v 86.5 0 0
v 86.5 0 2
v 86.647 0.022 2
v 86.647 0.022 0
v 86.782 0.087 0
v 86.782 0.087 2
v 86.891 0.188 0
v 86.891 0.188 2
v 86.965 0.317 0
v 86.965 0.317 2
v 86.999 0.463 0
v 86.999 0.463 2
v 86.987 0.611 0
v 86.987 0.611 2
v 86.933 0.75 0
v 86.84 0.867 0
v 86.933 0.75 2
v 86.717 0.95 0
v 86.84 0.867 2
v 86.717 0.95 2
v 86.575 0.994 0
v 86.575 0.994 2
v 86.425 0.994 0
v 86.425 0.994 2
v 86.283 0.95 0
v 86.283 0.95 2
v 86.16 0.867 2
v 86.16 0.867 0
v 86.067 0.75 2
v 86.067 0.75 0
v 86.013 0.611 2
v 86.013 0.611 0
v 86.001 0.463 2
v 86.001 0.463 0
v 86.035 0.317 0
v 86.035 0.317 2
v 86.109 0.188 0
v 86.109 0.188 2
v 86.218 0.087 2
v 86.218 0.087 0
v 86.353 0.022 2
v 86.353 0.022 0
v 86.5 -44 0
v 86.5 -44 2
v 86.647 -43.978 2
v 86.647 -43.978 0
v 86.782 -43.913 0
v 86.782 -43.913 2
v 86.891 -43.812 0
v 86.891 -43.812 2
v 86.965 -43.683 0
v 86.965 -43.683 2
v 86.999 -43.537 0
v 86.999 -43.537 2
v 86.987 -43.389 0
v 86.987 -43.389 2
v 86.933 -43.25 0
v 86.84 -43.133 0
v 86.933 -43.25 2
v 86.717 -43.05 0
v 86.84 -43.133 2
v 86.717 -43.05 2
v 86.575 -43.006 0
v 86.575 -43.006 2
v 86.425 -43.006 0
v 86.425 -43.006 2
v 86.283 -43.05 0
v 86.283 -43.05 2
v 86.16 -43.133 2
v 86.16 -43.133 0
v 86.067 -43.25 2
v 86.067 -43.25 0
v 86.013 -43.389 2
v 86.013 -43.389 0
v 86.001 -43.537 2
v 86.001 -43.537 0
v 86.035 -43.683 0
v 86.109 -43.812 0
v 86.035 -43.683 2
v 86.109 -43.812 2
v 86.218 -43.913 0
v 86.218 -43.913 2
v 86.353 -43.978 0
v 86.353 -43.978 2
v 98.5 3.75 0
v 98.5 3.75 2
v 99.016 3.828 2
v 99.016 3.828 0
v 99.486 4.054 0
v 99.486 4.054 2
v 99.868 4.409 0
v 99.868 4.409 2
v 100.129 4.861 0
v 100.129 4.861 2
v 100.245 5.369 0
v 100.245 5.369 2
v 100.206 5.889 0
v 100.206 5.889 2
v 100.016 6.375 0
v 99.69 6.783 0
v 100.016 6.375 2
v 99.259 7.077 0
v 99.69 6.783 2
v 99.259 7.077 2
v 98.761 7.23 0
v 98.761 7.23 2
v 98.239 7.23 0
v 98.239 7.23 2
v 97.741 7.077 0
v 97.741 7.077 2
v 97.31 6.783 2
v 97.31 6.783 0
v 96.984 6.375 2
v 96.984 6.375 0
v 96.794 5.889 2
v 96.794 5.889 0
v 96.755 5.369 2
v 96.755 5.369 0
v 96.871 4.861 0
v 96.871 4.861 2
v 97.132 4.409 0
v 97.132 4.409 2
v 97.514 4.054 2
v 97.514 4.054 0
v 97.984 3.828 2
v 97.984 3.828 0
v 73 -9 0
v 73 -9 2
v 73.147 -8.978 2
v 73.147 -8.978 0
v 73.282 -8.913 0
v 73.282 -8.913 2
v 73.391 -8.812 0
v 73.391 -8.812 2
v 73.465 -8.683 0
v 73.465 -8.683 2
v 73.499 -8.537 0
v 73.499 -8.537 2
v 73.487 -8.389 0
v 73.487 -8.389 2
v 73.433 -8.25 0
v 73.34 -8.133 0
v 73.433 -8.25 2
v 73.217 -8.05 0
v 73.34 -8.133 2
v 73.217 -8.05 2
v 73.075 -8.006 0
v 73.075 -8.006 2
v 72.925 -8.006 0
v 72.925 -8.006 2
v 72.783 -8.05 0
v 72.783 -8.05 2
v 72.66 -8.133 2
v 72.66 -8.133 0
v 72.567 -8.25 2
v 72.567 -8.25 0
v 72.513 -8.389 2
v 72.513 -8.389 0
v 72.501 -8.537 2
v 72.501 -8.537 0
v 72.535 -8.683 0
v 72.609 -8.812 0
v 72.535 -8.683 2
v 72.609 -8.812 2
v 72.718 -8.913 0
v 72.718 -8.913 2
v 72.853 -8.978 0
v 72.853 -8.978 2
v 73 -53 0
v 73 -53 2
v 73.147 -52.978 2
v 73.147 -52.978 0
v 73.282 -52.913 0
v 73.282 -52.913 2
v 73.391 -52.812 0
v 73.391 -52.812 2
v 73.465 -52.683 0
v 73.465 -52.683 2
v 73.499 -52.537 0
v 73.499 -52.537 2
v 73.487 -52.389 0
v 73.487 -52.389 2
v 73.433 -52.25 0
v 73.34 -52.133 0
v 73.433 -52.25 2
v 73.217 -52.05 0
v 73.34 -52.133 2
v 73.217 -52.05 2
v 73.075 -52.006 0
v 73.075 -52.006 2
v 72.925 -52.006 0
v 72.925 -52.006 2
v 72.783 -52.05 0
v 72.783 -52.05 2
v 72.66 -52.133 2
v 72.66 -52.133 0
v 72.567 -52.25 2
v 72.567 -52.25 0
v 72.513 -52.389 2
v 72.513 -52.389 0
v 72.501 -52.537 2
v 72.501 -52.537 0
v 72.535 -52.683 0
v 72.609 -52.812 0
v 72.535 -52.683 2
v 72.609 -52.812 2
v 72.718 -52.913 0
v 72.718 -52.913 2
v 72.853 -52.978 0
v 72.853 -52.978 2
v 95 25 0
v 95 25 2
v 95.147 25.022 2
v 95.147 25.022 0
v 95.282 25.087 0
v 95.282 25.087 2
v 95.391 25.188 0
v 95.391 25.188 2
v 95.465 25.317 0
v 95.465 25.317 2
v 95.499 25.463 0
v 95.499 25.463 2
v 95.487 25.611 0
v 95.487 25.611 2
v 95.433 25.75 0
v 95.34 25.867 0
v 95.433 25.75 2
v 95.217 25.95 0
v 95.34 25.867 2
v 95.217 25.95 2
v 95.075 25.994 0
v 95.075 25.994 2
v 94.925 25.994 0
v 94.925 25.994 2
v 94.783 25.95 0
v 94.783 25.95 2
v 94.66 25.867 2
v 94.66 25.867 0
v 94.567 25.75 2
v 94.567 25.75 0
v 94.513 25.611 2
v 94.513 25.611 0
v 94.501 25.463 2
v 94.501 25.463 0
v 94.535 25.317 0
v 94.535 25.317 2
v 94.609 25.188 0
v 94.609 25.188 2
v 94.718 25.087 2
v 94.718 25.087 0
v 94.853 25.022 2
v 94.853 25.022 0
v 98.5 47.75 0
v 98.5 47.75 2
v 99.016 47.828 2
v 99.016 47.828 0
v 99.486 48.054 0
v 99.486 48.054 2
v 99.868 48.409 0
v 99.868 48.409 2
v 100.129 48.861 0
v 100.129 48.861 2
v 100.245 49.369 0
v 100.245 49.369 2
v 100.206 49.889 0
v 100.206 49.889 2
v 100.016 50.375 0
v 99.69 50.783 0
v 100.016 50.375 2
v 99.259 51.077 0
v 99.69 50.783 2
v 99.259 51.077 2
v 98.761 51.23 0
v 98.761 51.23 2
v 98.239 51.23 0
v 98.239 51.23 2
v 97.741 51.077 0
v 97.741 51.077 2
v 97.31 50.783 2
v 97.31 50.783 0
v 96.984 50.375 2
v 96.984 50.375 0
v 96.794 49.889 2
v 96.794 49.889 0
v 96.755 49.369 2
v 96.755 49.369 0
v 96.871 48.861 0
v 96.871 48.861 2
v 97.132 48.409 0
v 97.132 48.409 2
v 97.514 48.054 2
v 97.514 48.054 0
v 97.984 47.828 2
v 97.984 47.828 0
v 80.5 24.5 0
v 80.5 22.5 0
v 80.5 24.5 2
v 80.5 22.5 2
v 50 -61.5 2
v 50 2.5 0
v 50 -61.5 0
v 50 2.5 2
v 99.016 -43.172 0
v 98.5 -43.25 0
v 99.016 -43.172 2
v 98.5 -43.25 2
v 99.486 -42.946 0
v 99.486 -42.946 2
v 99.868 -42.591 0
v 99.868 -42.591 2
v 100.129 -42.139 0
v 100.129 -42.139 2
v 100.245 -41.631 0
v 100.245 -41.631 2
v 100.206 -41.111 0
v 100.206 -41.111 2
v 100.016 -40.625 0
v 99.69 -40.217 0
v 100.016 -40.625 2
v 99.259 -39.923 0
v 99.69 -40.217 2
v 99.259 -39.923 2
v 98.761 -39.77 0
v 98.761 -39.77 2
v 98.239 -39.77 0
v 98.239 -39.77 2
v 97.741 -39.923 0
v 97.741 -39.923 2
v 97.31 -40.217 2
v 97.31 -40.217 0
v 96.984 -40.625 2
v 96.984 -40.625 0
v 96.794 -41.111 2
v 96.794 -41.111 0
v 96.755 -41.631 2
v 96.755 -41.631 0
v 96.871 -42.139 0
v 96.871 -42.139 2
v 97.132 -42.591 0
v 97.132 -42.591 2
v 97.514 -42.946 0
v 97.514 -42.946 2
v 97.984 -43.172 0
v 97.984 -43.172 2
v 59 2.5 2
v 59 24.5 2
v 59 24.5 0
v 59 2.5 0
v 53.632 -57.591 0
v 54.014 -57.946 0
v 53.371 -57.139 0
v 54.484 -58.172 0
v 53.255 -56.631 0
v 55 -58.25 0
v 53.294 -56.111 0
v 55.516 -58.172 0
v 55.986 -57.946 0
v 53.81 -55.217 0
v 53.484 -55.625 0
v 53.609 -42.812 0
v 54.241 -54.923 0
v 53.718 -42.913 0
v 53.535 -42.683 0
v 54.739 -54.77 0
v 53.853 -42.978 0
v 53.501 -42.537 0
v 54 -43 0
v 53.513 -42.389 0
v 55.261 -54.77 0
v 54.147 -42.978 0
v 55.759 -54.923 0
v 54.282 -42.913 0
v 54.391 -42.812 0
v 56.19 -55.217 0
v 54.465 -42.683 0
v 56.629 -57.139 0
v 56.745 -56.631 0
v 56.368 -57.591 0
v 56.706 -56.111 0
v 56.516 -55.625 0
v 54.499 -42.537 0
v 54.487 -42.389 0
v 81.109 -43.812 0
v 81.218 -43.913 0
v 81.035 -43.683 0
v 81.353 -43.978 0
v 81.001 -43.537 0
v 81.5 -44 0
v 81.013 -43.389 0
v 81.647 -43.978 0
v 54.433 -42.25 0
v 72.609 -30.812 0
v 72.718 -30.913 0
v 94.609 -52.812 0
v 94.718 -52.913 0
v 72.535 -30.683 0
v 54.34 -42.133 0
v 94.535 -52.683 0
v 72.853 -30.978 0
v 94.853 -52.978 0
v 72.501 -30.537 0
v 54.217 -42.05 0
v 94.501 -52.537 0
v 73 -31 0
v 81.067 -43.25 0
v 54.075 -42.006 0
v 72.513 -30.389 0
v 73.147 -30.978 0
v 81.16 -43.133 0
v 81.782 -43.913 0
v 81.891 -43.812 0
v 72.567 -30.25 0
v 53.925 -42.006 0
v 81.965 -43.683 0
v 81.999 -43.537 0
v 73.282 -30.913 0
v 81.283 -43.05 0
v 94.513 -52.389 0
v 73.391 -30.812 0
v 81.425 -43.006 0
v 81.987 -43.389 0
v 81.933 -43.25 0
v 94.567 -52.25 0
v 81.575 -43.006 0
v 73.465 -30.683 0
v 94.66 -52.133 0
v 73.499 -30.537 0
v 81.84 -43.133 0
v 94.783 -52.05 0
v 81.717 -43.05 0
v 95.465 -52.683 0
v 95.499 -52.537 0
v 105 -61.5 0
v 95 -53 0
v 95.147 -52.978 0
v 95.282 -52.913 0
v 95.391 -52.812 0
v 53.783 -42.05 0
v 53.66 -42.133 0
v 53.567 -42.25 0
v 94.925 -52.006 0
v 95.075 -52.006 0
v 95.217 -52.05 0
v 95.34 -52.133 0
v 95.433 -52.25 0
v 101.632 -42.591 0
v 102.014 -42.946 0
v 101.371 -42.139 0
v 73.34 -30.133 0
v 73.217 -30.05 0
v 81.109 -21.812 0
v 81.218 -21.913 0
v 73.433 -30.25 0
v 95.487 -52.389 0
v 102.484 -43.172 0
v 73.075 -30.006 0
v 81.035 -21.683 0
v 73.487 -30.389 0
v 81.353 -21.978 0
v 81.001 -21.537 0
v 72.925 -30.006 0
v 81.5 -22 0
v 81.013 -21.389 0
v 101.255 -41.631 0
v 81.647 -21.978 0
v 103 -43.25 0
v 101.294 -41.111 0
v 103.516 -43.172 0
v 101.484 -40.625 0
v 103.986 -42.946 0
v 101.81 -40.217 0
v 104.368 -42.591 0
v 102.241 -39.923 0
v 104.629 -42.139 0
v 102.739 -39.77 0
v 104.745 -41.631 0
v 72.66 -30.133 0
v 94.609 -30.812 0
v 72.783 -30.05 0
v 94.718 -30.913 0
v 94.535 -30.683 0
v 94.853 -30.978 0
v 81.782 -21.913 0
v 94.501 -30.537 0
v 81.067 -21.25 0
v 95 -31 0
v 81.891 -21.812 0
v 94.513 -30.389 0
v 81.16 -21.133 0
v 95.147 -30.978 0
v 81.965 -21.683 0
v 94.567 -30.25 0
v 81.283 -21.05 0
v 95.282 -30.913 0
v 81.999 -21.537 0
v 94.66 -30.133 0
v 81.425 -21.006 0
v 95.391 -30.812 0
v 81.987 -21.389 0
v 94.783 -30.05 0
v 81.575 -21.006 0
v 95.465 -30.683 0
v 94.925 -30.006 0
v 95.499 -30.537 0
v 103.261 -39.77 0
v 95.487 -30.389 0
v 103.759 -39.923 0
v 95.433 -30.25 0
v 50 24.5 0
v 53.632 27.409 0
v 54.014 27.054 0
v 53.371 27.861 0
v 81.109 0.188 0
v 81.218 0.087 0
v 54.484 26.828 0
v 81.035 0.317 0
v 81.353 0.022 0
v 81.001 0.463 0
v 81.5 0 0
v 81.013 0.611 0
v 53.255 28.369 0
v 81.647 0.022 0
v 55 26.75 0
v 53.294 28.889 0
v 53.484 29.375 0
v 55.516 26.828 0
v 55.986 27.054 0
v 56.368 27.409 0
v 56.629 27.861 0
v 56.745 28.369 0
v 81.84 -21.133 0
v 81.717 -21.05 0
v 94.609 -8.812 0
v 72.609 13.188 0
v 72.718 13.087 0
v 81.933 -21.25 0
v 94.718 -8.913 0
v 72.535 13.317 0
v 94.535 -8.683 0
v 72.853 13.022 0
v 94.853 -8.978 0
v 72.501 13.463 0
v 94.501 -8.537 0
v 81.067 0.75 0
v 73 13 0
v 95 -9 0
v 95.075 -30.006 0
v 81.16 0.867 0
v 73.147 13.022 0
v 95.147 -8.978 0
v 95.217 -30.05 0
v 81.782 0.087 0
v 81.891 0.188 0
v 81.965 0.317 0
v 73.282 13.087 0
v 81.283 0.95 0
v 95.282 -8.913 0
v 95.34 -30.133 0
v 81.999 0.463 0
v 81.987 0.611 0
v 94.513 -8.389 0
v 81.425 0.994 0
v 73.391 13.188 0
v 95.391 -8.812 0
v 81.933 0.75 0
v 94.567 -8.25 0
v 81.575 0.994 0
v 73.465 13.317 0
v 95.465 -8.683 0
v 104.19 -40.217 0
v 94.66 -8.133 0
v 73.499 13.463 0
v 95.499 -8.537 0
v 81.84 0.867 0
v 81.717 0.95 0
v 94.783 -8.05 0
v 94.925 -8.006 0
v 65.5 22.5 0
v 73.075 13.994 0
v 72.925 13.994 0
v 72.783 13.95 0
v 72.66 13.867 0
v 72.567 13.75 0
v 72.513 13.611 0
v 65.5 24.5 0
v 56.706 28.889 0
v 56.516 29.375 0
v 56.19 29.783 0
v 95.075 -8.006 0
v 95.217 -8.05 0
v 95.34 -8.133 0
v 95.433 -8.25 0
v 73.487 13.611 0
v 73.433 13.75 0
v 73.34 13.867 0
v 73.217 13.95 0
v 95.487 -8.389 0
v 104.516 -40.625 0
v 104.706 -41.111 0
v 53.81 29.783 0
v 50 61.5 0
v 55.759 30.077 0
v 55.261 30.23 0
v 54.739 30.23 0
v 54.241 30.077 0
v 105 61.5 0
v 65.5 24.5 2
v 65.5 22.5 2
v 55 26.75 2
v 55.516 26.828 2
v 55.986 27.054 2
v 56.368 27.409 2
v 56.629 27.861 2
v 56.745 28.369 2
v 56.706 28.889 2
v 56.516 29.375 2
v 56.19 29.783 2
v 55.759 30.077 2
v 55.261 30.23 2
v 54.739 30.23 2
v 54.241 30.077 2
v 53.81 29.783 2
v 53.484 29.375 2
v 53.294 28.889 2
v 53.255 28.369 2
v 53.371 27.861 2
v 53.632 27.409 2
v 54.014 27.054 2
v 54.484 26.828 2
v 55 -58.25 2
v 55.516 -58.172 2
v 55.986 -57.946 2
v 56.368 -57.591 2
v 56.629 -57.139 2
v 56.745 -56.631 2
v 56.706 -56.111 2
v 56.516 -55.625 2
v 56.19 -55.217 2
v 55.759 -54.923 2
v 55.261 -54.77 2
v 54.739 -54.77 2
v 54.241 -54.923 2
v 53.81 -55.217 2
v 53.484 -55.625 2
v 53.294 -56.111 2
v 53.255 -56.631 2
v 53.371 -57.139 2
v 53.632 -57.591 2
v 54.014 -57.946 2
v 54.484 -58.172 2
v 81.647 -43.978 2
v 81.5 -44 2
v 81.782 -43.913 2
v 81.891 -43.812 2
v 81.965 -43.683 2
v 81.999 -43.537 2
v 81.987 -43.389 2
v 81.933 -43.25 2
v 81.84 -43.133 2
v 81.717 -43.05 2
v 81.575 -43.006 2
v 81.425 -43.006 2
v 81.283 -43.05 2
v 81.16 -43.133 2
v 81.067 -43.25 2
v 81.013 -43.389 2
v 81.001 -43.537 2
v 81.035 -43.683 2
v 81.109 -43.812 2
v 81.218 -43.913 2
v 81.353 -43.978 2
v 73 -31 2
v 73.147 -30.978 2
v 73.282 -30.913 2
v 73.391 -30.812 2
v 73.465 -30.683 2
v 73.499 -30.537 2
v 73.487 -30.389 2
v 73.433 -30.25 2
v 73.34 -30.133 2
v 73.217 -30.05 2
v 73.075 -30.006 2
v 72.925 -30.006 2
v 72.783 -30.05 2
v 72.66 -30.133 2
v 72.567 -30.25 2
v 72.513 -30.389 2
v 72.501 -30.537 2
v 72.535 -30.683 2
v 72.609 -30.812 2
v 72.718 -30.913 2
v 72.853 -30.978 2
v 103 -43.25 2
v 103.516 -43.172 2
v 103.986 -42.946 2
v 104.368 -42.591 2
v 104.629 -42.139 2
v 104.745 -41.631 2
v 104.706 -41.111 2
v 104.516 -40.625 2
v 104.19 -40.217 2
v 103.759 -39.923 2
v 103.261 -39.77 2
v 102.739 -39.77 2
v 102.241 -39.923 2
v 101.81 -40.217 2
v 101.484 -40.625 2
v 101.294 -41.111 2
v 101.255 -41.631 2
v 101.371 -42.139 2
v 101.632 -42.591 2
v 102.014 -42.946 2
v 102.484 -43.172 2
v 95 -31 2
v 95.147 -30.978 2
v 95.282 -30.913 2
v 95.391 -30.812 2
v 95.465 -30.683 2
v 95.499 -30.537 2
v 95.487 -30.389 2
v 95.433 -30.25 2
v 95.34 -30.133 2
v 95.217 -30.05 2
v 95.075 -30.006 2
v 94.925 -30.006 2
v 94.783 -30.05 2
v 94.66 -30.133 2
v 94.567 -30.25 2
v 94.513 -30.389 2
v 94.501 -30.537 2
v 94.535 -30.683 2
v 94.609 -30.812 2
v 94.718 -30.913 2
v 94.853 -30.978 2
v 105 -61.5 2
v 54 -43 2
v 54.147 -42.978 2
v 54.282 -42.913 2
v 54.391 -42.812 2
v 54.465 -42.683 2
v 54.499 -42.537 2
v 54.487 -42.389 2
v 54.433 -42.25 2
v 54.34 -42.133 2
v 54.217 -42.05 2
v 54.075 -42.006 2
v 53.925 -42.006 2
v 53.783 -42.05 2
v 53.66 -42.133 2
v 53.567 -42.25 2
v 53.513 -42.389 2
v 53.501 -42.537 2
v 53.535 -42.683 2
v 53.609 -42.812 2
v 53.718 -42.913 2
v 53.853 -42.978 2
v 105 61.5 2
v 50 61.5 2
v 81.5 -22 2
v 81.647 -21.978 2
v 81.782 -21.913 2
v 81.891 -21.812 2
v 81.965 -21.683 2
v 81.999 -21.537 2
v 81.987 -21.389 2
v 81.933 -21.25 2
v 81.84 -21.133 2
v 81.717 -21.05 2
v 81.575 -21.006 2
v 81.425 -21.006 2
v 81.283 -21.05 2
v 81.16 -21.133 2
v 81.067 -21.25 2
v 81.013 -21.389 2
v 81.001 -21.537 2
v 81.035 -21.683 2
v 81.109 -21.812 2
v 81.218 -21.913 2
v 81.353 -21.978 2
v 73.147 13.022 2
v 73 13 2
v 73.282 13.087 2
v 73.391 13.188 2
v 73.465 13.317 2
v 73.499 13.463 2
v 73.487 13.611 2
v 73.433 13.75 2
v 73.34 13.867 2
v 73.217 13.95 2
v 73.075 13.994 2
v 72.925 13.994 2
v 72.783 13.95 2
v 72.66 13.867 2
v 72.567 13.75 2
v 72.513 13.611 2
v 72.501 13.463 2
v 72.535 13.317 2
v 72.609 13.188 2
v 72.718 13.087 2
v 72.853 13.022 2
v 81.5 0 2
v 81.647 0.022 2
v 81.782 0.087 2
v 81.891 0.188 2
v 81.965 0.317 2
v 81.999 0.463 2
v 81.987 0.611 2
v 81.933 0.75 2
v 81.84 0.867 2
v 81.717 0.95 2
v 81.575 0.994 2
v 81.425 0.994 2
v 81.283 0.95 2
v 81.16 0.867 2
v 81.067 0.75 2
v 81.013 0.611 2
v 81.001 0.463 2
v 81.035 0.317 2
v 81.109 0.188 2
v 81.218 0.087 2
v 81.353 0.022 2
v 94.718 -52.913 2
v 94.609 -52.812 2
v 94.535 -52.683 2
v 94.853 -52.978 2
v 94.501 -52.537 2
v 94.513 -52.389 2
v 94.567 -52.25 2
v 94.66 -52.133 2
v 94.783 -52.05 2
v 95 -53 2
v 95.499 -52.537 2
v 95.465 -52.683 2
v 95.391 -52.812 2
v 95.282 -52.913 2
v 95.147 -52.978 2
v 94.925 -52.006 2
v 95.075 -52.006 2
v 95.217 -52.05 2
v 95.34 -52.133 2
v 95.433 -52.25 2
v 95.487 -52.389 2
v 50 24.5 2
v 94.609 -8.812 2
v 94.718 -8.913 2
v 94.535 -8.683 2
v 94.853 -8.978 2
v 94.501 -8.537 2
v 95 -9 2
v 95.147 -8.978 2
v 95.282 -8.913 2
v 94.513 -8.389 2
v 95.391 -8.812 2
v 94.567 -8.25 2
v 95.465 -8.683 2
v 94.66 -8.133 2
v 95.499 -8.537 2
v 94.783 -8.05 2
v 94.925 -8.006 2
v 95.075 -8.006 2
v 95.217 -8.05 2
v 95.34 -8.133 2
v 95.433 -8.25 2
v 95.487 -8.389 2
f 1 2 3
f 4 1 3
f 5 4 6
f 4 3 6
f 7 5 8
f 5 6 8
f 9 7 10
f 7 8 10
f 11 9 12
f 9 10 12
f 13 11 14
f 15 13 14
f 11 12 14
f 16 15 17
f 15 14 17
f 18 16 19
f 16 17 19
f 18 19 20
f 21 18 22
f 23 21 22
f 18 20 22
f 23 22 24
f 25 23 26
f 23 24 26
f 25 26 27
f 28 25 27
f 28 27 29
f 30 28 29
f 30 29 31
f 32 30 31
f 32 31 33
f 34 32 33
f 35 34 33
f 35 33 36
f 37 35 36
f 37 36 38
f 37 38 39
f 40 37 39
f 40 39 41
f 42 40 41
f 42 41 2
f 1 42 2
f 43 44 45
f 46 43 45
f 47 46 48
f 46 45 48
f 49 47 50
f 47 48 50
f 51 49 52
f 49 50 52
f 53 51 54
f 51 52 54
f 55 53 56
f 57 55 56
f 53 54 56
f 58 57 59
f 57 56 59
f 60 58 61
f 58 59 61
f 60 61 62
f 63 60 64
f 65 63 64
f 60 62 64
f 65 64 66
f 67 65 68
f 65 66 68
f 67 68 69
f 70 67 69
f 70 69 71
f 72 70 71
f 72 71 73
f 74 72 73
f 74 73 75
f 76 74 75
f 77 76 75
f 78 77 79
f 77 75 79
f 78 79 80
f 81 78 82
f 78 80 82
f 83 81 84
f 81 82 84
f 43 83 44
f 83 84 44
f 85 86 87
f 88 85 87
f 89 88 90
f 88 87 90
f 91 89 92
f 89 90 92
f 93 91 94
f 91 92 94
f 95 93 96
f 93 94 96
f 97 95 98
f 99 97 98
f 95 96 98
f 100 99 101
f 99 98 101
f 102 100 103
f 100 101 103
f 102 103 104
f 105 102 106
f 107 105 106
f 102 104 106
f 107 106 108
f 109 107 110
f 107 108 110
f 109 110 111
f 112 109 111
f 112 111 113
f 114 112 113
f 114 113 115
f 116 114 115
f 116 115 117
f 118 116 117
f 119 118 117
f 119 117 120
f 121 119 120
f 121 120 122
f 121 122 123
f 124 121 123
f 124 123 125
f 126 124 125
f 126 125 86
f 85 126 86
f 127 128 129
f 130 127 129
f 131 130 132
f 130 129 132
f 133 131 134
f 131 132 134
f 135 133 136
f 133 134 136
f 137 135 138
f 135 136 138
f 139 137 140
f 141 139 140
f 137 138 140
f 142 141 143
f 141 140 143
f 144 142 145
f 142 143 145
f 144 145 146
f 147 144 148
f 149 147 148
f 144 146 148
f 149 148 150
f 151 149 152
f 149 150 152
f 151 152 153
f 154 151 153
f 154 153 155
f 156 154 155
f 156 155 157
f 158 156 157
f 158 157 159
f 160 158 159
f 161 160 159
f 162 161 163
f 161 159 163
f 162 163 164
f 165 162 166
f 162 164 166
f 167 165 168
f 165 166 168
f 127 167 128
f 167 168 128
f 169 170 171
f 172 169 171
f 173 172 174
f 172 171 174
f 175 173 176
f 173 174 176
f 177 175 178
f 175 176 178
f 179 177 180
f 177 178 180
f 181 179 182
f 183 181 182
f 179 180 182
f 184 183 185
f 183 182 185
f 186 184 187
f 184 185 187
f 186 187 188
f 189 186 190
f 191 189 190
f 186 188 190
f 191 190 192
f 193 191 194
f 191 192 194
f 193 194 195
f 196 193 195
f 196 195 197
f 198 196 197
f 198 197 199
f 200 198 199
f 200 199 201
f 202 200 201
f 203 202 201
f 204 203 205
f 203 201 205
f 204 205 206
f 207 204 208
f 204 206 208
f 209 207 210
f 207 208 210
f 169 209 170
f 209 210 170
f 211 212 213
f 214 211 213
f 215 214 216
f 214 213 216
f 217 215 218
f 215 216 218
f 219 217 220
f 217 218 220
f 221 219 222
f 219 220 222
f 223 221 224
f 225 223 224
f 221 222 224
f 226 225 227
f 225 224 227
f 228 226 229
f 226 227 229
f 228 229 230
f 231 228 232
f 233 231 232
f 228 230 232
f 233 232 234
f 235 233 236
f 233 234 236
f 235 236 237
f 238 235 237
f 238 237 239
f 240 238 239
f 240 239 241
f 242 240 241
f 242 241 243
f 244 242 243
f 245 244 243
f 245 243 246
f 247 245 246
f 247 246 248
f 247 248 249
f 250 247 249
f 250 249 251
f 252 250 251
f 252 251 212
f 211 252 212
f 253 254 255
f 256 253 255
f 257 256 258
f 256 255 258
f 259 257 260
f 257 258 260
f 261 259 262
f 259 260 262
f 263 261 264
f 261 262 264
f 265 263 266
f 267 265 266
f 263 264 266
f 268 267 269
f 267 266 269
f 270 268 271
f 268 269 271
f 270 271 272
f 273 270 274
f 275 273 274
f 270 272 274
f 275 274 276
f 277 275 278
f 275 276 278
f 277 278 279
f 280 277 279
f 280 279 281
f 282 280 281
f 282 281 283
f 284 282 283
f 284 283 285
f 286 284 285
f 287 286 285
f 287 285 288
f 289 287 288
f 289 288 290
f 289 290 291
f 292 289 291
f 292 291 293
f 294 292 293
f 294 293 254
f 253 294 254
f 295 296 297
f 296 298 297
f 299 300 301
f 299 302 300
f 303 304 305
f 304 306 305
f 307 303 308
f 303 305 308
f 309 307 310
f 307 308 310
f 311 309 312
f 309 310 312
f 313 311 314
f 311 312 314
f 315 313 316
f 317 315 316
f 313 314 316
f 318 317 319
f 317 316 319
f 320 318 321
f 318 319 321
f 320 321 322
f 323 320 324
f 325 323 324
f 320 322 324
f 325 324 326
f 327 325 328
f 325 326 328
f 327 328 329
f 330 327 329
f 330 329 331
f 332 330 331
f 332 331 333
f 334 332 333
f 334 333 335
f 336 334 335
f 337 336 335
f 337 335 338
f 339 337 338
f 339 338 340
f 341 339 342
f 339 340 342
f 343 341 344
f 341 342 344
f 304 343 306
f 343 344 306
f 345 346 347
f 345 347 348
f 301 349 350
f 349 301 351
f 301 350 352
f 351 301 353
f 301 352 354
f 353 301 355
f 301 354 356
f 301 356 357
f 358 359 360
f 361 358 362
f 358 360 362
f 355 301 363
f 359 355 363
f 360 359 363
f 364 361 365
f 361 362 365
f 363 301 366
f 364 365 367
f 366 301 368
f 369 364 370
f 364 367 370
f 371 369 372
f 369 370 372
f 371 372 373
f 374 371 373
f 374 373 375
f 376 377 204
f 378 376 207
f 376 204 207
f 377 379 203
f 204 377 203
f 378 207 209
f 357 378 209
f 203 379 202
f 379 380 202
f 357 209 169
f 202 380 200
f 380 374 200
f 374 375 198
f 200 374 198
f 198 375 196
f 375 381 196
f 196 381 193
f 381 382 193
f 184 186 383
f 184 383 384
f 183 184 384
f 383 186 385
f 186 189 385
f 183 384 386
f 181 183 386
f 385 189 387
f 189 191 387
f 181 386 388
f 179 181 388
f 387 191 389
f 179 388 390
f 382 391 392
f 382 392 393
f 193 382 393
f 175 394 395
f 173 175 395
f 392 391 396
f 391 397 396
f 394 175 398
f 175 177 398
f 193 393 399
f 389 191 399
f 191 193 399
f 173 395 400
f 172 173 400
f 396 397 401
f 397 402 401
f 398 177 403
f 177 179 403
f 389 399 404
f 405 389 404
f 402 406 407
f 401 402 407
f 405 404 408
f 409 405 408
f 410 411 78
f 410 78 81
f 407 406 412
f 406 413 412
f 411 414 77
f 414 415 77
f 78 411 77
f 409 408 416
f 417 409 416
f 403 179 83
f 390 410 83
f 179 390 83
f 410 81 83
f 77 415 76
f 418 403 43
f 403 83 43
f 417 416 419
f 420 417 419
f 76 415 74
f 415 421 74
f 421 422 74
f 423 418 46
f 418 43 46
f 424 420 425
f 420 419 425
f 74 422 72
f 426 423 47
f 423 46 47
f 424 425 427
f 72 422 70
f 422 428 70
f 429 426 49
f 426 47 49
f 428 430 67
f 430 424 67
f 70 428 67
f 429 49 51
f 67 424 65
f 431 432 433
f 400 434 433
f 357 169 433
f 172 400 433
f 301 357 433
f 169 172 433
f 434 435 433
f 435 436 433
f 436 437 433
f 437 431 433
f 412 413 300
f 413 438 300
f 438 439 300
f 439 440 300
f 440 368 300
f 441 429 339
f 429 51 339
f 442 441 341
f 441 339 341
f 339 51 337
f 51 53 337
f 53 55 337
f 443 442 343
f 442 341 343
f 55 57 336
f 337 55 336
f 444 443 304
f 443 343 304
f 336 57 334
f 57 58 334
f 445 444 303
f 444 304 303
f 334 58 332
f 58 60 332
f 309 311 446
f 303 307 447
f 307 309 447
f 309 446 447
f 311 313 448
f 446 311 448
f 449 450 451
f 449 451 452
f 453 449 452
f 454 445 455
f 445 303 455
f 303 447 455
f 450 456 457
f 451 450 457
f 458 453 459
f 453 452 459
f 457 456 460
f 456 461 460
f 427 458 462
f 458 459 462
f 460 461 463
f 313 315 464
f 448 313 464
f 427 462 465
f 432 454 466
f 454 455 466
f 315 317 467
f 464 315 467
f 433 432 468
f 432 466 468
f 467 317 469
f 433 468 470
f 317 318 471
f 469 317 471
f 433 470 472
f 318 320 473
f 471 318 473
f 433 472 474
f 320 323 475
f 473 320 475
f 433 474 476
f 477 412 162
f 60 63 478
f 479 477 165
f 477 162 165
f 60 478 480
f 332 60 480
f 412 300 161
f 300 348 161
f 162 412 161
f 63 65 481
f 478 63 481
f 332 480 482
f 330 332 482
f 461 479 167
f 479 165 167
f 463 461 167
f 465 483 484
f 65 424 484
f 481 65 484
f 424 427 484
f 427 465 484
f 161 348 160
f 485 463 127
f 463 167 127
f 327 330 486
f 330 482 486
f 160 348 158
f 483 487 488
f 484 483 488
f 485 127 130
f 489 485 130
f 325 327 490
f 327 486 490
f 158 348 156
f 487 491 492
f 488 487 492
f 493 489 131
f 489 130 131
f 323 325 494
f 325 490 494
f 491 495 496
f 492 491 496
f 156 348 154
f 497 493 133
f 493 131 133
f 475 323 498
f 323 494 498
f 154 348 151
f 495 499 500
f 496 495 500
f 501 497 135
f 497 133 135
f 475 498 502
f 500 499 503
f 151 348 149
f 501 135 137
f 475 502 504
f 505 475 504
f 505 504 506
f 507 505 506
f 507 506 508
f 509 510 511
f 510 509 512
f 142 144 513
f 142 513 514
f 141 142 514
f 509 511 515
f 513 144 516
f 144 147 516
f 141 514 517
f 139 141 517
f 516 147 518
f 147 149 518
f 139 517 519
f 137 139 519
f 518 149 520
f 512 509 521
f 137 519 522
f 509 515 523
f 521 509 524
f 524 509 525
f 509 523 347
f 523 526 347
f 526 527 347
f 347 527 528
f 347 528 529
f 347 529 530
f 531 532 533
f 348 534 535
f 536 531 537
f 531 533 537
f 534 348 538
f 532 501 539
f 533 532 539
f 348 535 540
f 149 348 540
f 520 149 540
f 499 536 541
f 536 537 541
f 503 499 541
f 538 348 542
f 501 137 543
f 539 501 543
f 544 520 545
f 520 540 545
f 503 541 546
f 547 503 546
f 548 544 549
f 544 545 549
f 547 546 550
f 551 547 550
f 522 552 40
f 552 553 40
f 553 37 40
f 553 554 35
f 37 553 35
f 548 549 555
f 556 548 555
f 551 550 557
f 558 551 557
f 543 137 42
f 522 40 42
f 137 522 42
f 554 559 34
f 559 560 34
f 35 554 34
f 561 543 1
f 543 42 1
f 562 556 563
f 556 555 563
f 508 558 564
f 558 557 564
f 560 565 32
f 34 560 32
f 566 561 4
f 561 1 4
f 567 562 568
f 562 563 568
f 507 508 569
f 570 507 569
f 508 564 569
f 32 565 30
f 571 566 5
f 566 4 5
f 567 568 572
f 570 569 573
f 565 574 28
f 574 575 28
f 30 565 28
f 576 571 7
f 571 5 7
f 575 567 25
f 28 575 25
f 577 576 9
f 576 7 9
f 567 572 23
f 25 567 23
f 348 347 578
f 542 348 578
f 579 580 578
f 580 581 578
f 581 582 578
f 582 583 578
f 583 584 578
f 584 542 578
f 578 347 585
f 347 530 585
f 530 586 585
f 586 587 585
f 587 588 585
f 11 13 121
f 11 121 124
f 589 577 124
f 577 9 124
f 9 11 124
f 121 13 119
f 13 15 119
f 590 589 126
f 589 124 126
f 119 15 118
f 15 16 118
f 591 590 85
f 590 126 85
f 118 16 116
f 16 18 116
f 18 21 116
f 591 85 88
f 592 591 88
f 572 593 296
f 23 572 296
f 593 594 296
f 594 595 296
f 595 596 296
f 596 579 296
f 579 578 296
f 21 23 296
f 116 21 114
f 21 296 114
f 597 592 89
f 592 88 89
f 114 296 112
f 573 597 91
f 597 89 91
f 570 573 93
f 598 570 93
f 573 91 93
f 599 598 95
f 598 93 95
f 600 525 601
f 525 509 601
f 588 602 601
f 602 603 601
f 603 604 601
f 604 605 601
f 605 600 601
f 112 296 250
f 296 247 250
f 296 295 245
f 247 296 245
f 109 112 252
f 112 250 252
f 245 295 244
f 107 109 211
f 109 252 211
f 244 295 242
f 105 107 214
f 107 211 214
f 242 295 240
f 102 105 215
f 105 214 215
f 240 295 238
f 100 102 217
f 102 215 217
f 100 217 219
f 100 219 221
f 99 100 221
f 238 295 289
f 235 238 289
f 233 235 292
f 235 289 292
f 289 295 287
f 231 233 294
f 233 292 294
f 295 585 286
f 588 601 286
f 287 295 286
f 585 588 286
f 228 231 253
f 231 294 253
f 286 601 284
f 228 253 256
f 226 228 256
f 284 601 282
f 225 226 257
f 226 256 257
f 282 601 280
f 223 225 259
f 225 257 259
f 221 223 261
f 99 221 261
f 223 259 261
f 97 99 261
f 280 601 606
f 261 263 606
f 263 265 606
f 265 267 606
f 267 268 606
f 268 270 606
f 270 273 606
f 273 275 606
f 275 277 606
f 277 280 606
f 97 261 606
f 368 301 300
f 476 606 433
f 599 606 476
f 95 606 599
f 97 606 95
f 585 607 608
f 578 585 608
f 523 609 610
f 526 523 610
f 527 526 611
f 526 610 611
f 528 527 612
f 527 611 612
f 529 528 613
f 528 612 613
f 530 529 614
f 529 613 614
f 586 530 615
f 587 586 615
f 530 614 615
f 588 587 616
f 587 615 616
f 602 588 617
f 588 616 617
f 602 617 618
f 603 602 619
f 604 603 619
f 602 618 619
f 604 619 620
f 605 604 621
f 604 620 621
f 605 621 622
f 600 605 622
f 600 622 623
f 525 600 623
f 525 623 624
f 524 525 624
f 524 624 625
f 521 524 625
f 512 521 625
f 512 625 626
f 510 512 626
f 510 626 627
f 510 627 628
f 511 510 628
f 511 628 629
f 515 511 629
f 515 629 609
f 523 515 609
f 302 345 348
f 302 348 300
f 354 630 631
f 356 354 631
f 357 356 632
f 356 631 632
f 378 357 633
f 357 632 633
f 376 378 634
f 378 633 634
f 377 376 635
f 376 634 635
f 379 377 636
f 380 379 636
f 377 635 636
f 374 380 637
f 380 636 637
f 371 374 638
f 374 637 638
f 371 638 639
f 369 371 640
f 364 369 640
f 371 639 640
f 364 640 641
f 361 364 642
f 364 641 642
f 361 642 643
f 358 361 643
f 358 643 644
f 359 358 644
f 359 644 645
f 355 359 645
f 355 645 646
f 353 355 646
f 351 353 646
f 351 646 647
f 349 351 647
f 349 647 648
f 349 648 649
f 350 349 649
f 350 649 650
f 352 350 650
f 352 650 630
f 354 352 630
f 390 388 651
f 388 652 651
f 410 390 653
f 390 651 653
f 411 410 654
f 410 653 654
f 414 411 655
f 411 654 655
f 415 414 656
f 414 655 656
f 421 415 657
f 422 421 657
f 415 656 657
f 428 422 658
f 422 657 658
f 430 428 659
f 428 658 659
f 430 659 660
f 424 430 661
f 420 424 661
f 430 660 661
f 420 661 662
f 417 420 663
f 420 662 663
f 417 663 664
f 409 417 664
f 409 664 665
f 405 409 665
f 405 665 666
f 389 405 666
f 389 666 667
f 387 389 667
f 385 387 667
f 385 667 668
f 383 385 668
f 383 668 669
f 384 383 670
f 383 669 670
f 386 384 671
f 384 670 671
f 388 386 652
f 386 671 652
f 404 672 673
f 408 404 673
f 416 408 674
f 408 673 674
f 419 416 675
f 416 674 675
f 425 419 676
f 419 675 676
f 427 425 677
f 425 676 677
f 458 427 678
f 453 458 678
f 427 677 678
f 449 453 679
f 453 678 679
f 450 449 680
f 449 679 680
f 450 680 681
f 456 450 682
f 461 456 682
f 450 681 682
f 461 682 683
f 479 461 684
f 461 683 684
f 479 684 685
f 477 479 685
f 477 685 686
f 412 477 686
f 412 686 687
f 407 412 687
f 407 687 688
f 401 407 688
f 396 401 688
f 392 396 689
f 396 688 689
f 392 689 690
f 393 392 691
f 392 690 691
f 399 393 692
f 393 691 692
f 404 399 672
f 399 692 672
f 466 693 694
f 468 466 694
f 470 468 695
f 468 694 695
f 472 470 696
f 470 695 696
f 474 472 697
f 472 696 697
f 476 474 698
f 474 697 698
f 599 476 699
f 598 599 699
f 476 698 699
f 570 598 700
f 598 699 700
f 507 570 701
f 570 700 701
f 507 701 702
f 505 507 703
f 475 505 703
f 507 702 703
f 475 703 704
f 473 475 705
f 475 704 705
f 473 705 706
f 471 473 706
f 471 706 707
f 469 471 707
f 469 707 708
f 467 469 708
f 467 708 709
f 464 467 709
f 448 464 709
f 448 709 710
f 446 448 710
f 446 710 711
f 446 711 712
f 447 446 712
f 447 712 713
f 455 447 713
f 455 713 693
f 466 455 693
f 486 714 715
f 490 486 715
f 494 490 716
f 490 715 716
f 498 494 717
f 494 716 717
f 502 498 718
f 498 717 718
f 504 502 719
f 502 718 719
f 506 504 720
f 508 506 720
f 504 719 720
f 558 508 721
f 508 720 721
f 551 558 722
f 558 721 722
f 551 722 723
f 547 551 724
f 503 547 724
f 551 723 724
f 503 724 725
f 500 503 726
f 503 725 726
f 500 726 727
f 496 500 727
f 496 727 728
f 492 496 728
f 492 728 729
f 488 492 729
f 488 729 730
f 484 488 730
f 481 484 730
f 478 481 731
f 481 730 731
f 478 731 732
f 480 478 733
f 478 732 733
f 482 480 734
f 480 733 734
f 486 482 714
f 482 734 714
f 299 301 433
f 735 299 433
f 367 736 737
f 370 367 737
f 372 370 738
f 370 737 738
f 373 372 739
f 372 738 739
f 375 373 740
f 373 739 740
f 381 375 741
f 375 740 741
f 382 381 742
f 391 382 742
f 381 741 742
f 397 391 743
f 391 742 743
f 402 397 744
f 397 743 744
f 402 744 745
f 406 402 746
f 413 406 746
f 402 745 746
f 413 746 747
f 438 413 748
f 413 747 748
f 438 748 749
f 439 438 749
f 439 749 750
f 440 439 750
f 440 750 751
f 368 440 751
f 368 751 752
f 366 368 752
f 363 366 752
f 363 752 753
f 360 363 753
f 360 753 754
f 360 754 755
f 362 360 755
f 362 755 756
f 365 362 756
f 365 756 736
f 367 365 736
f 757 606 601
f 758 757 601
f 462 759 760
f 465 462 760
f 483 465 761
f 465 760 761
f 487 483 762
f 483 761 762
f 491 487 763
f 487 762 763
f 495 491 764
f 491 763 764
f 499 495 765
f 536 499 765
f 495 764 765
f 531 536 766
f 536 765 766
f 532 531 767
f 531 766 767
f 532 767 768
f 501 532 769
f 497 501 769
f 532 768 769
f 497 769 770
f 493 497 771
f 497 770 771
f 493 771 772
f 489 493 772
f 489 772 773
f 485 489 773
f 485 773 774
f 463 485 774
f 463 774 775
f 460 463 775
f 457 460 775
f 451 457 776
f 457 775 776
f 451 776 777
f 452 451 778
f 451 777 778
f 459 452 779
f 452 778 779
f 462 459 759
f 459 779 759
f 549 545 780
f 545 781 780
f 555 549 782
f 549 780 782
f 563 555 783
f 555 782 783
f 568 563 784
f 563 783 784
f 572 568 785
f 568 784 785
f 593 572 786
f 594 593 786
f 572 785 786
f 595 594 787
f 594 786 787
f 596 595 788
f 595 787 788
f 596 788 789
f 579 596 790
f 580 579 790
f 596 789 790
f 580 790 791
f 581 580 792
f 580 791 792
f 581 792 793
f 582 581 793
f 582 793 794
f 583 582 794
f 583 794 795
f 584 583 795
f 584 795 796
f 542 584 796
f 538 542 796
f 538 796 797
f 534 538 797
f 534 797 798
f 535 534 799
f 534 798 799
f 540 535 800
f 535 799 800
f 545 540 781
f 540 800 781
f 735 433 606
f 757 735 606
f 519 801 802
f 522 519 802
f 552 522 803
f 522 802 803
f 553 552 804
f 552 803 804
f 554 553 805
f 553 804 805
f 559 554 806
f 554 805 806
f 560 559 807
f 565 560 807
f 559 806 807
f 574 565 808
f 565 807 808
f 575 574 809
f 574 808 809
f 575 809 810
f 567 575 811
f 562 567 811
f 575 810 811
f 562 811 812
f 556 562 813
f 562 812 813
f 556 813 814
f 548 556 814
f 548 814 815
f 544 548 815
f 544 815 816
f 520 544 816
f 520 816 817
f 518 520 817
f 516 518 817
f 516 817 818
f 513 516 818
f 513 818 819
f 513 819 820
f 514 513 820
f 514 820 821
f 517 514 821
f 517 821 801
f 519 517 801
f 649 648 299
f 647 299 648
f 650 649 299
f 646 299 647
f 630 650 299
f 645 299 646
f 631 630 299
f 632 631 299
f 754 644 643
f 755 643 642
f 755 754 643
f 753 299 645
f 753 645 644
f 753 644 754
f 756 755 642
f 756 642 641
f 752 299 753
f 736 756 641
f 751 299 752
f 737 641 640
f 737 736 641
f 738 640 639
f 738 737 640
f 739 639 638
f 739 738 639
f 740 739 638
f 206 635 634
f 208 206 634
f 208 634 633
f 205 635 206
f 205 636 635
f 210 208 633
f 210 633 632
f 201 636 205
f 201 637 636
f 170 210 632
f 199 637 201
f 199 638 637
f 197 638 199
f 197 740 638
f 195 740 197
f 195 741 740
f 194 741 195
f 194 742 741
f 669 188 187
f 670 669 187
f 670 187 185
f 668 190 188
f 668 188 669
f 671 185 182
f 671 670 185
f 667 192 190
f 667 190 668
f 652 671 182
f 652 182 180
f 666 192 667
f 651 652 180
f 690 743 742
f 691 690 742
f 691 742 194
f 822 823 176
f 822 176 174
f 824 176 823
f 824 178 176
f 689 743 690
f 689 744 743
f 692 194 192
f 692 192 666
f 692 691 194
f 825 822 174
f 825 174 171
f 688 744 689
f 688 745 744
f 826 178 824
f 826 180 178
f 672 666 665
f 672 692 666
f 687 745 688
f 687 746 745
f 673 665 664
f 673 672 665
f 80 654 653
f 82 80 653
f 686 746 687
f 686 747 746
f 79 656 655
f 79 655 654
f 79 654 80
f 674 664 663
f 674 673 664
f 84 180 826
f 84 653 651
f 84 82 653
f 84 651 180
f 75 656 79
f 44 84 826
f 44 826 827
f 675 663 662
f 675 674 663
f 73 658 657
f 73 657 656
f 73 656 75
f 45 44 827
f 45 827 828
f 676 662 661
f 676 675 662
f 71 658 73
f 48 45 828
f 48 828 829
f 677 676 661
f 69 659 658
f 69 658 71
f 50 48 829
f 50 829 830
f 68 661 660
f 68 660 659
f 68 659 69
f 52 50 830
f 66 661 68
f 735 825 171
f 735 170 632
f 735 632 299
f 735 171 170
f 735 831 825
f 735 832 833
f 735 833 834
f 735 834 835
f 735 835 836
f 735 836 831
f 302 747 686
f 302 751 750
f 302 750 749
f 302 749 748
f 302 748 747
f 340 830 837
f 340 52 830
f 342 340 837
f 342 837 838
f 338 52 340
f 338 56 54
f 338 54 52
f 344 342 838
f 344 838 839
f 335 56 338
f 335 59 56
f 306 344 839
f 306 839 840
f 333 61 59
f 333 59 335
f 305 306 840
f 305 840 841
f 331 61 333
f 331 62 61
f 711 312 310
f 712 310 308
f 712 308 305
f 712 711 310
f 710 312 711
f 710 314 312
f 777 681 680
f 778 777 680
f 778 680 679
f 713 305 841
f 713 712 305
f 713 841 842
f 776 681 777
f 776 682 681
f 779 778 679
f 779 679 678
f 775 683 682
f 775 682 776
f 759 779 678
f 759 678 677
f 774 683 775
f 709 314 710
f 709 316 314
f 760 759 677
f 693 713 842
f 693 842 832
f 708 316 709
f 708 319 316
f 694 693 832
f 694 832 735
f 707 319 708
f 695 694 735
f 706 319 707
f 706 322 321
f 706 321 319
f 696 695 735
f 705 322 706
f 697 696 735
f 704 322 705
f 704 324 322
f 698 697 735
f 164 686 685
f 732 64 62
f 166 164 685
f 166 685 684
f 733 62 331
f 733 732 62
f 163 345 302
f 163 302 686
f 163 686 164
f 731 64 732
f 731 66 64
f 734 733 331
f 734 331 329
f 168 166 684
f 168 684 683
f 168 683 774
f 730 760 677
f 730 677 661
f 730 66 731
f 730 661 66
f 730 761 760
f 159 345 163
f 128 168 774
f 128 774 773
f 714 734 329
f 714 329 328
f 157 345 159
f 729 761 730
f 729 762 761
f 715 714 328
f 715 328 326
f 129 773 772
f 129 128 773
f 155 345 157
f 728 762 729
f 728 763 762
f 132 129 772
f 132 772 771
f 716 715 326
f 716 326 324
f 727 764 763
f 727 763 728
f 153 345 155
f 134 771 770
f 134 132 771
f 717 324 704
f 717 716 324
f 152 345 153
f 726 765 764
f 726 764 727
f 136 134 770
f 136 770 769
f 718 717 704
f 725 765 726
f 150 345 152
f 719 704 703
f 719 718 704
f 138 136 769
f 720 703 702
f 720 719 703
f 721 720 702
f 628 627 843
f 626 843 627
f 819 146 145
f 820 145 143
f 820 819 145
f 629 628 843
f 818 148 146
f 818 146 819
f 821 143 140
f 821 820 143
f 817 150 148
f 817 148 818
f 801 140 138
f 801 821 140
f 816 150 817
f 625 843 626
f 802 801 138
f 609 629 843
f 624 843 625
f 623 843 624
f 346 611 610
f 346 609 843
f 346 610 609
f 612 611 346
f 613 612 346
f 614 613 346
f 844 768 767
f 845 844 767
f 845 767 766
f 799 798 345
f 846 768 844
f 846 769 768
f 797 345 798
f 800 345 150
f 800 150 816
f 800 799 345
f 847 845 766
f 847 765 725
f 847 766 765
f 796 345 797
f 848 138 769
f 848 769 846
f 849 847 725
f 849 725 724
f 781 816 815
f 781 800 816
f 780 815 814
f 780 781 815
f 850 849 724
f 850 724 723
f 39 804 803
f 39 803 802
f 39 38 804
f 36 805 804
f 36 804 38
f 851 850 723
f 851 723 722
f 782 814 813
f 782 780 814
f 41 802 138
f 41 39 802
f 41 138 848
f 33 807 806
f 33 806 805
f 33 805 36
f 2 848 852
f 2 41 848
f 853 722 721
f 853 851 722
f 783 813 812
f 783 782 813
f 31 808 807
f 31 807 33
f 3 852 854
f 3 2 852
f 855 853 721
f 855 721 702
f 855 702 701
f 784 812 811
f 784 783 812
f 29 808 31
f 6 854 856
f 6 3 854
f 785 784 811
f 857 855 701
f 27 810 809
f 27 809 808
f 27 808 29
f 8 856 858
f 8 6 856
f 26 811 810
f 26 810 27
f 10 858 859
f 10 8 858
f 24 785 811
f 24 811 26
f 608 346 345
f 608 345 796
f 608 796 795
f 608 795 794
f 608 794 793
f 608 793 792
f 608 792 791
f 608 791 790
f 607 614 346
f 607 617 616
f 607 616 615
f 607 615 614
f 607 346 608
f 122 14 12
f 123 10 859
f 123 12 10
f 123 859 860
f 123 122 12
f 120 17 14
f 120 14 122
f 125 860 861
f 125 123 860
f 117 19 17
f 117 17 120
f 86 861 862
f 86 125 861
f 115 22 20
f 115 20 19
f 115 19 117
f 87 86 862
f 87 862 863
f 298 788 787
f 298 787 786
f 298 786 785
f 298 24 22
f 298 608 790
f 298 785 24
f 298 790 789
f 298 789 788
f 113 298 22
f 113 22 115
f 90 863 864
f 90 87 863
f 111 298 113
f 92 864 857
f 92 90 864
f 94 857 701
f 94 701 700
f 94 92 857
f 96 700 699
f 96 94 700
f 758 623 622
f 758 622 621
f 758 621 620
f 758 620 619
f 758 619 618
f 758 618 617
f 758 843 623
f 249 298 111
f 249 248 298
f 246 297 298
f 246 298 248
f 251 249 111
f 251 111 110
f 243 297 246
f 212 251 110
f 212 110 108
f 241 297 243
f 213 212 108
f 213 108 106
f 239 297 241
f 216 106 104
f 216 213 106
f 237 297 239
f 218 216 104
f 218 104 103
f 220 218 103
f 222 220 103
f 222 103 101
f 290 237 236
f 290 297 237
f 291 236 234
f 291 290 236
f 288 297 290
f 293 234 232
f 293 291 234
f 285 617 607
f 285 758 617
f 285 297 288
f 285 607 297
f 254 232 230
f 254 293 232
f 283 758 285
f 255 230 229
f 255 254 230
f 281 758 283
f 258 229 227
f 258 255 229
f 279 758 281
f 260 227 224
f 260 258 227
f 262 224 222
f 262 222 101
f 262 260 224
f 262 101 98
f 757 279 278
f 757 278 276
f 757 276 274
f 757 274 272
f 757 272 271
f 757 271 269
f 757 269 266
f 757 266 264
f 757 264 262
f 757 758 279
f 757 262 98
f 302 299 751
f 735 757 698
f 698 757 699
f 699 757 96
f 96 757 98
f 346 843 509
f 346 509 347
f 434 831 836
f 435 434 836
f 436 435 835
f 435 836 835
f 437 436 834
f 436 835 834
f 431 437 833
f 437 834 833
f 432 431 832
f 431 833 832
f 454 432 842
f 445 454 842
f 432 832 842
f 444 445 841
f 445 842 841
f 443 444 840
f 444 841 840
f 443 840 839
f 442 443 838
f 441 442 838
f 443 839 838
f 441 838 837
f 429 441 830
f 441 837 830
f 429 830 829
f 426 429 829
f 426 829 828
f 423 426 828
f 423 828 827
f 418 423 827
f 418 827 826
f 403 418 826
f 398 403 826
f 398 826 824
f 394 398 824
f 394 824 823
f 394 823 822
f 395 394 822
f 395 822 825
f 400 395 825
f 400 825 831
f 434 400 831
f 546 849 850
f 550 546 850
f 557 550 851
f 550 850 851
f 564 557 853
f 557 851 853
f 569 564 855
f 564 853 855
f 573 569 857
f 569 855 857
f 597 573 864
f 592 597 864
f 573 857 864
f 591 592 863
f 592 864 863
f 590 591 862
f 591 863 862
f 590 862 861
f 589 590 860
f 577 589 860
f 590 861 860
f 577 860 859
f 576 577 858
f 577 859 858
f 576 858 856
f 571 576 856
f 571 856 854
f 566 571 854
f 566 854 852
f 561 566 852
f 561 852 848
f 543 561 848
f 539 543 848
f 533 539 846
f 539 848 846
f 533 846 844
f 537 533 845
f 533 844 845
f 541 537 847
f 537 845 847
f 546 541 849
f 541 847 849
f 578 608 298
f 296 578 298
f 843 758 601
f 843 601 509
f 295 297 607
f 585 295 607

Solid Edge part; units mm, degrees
sketch "Sketch1" plane through (0, 0, 0) normal (0, 0, 1) x (1, 0, 0)
  line L0 (-105, -61.5) -> (105, -61.5)
  line L1 (105, -61.5) -> (105, 61.5)
  line L2 (105, 61.5) -> (-105, 61.5)
  line L3 (-105, 61.5) -> (-105, -61.5)
  dimension "D1" = 123
  dimension "D2" = 210
extrude "Protrusion1" add sketch "Sketch1" along normal blind 2
hole "Hole1" at (73, -52.5, 2) direction (0, 0, -1) diameter 1 end through all
hole "Hole2" at (73, -30.5, 2) direction (0, 0, -1) diameter 1 end through all
hole "Hole3" at (73, -8.5, 2) direction (0, 0, -1) diameter 1 end through all
hole "Hole4" at (95, -8.5, 2) direction (0, 0, -1) diameter 1 end through all
hole "Hole5" at (95, -30.5, 2) direction (0, 0, -1) diameter 1 end through all
hole "Hole6" at (73, 13.5, 2) direction (0, 0, -1) diameter 1 end through all
hole "Hole7" at (95, -52.5, 2) direction (0, 0, -1) diameter 1 end through all
sketch "Sketch2" plane through (0, 0, 2) normal (0, 0, 1) x (1, 0, 0)
  line L0 (65.5, 22.5) -> (80.5, 22.5)
  line L1 (80.5, 22.5) -> (80.5, 24.5)
  line L2 (80.5, 24.5) -> (65.5, 24.5)
  line L3 (65.5, 24.5) -> (65.5, 22.5)
  dimension "D1" = 15
  dimension "D2" = 2
  dimension "D3" = 32
  dimension "D4" = 38
extrude "Cutout1" cut sketch "Sketch2" against normal through all
sketch "Sketch3" plane through (0, 0, 2) normal (0, 0, 1) x (1, 0, 0)
  line L0 (-105, -61.5) -> (50, -61.5)
  line L1 (50, 2.5) -> (50, -61.5)
  line L2 (59, 2.5) -> (50, 2.5)
  line L3 (59, 24.5) -> (59, 2.5)
  line L4 (50, 24.5) -> (59, 24.5)
  line L5 (50, 61.5) -> (50, 24.5)
  line L6 (50, 61.5) -> (-105, 61.5)
  line L7 (-105, 61.5) -> (-105, -61.5)
  dimension "D1" = 9
  dimension "D2" = 22
  dimension "D3" = 37
  dimension "D4" = 55
extrude "Ausschnitt_3" cut sketch "Sketch3" against normal blind 2
hole "Hole8" at (98.5, 49.5, 2) direction (0, 0, -1) diameter 3.5 end through all
hole "Hole9" at (98.5, -41.5, 2) direction (0, 0, -1) diameter 3.5 end through all
hole "Hole10" at (55, -56.5, 2) direction (0, 0, -1) diameter 3.5 end through all
hole "Hole11" at (98.5, 5.5, 2) direction (0, 0, -1) diameter 3.5 end through all
hole "Hole12" at (55, 28.5, 2) direction (0, 0, -1) diameter 3.5 end through all
hole "Befestigungsbohrung_Plus" at (103, -41.5, 2) direction (0, 0, -1) diameter 3.5 end through all
hole "Hole13" at (54, -42.5, 2) direction (0, 0, -1) diameter 1 end through all
hole "Inkrementalgeber" at (95, 25.5, 2) direction (0, 0, -1) diameter 1 end through all
hole "Hole14" at (81.5, -43.5, 2) direction (0, 0, -1) diameter 1 end through all
hole "Hole15" at (81.5, -21.5, 2) direction (0, 0, -1) diameter 1 end through all
hole "Hole16" at (81.5, 0.5, 2) direction (0, 0, -1) diameter 1 end through all
hole "Hole17" at (86.5, 0.5, 2) direction (0, 0, -1) diameter 1 end through all
hole "Hole18" at (86.5, -43.5, 2) direction (0, 0, -1) diameter 1 end through all
